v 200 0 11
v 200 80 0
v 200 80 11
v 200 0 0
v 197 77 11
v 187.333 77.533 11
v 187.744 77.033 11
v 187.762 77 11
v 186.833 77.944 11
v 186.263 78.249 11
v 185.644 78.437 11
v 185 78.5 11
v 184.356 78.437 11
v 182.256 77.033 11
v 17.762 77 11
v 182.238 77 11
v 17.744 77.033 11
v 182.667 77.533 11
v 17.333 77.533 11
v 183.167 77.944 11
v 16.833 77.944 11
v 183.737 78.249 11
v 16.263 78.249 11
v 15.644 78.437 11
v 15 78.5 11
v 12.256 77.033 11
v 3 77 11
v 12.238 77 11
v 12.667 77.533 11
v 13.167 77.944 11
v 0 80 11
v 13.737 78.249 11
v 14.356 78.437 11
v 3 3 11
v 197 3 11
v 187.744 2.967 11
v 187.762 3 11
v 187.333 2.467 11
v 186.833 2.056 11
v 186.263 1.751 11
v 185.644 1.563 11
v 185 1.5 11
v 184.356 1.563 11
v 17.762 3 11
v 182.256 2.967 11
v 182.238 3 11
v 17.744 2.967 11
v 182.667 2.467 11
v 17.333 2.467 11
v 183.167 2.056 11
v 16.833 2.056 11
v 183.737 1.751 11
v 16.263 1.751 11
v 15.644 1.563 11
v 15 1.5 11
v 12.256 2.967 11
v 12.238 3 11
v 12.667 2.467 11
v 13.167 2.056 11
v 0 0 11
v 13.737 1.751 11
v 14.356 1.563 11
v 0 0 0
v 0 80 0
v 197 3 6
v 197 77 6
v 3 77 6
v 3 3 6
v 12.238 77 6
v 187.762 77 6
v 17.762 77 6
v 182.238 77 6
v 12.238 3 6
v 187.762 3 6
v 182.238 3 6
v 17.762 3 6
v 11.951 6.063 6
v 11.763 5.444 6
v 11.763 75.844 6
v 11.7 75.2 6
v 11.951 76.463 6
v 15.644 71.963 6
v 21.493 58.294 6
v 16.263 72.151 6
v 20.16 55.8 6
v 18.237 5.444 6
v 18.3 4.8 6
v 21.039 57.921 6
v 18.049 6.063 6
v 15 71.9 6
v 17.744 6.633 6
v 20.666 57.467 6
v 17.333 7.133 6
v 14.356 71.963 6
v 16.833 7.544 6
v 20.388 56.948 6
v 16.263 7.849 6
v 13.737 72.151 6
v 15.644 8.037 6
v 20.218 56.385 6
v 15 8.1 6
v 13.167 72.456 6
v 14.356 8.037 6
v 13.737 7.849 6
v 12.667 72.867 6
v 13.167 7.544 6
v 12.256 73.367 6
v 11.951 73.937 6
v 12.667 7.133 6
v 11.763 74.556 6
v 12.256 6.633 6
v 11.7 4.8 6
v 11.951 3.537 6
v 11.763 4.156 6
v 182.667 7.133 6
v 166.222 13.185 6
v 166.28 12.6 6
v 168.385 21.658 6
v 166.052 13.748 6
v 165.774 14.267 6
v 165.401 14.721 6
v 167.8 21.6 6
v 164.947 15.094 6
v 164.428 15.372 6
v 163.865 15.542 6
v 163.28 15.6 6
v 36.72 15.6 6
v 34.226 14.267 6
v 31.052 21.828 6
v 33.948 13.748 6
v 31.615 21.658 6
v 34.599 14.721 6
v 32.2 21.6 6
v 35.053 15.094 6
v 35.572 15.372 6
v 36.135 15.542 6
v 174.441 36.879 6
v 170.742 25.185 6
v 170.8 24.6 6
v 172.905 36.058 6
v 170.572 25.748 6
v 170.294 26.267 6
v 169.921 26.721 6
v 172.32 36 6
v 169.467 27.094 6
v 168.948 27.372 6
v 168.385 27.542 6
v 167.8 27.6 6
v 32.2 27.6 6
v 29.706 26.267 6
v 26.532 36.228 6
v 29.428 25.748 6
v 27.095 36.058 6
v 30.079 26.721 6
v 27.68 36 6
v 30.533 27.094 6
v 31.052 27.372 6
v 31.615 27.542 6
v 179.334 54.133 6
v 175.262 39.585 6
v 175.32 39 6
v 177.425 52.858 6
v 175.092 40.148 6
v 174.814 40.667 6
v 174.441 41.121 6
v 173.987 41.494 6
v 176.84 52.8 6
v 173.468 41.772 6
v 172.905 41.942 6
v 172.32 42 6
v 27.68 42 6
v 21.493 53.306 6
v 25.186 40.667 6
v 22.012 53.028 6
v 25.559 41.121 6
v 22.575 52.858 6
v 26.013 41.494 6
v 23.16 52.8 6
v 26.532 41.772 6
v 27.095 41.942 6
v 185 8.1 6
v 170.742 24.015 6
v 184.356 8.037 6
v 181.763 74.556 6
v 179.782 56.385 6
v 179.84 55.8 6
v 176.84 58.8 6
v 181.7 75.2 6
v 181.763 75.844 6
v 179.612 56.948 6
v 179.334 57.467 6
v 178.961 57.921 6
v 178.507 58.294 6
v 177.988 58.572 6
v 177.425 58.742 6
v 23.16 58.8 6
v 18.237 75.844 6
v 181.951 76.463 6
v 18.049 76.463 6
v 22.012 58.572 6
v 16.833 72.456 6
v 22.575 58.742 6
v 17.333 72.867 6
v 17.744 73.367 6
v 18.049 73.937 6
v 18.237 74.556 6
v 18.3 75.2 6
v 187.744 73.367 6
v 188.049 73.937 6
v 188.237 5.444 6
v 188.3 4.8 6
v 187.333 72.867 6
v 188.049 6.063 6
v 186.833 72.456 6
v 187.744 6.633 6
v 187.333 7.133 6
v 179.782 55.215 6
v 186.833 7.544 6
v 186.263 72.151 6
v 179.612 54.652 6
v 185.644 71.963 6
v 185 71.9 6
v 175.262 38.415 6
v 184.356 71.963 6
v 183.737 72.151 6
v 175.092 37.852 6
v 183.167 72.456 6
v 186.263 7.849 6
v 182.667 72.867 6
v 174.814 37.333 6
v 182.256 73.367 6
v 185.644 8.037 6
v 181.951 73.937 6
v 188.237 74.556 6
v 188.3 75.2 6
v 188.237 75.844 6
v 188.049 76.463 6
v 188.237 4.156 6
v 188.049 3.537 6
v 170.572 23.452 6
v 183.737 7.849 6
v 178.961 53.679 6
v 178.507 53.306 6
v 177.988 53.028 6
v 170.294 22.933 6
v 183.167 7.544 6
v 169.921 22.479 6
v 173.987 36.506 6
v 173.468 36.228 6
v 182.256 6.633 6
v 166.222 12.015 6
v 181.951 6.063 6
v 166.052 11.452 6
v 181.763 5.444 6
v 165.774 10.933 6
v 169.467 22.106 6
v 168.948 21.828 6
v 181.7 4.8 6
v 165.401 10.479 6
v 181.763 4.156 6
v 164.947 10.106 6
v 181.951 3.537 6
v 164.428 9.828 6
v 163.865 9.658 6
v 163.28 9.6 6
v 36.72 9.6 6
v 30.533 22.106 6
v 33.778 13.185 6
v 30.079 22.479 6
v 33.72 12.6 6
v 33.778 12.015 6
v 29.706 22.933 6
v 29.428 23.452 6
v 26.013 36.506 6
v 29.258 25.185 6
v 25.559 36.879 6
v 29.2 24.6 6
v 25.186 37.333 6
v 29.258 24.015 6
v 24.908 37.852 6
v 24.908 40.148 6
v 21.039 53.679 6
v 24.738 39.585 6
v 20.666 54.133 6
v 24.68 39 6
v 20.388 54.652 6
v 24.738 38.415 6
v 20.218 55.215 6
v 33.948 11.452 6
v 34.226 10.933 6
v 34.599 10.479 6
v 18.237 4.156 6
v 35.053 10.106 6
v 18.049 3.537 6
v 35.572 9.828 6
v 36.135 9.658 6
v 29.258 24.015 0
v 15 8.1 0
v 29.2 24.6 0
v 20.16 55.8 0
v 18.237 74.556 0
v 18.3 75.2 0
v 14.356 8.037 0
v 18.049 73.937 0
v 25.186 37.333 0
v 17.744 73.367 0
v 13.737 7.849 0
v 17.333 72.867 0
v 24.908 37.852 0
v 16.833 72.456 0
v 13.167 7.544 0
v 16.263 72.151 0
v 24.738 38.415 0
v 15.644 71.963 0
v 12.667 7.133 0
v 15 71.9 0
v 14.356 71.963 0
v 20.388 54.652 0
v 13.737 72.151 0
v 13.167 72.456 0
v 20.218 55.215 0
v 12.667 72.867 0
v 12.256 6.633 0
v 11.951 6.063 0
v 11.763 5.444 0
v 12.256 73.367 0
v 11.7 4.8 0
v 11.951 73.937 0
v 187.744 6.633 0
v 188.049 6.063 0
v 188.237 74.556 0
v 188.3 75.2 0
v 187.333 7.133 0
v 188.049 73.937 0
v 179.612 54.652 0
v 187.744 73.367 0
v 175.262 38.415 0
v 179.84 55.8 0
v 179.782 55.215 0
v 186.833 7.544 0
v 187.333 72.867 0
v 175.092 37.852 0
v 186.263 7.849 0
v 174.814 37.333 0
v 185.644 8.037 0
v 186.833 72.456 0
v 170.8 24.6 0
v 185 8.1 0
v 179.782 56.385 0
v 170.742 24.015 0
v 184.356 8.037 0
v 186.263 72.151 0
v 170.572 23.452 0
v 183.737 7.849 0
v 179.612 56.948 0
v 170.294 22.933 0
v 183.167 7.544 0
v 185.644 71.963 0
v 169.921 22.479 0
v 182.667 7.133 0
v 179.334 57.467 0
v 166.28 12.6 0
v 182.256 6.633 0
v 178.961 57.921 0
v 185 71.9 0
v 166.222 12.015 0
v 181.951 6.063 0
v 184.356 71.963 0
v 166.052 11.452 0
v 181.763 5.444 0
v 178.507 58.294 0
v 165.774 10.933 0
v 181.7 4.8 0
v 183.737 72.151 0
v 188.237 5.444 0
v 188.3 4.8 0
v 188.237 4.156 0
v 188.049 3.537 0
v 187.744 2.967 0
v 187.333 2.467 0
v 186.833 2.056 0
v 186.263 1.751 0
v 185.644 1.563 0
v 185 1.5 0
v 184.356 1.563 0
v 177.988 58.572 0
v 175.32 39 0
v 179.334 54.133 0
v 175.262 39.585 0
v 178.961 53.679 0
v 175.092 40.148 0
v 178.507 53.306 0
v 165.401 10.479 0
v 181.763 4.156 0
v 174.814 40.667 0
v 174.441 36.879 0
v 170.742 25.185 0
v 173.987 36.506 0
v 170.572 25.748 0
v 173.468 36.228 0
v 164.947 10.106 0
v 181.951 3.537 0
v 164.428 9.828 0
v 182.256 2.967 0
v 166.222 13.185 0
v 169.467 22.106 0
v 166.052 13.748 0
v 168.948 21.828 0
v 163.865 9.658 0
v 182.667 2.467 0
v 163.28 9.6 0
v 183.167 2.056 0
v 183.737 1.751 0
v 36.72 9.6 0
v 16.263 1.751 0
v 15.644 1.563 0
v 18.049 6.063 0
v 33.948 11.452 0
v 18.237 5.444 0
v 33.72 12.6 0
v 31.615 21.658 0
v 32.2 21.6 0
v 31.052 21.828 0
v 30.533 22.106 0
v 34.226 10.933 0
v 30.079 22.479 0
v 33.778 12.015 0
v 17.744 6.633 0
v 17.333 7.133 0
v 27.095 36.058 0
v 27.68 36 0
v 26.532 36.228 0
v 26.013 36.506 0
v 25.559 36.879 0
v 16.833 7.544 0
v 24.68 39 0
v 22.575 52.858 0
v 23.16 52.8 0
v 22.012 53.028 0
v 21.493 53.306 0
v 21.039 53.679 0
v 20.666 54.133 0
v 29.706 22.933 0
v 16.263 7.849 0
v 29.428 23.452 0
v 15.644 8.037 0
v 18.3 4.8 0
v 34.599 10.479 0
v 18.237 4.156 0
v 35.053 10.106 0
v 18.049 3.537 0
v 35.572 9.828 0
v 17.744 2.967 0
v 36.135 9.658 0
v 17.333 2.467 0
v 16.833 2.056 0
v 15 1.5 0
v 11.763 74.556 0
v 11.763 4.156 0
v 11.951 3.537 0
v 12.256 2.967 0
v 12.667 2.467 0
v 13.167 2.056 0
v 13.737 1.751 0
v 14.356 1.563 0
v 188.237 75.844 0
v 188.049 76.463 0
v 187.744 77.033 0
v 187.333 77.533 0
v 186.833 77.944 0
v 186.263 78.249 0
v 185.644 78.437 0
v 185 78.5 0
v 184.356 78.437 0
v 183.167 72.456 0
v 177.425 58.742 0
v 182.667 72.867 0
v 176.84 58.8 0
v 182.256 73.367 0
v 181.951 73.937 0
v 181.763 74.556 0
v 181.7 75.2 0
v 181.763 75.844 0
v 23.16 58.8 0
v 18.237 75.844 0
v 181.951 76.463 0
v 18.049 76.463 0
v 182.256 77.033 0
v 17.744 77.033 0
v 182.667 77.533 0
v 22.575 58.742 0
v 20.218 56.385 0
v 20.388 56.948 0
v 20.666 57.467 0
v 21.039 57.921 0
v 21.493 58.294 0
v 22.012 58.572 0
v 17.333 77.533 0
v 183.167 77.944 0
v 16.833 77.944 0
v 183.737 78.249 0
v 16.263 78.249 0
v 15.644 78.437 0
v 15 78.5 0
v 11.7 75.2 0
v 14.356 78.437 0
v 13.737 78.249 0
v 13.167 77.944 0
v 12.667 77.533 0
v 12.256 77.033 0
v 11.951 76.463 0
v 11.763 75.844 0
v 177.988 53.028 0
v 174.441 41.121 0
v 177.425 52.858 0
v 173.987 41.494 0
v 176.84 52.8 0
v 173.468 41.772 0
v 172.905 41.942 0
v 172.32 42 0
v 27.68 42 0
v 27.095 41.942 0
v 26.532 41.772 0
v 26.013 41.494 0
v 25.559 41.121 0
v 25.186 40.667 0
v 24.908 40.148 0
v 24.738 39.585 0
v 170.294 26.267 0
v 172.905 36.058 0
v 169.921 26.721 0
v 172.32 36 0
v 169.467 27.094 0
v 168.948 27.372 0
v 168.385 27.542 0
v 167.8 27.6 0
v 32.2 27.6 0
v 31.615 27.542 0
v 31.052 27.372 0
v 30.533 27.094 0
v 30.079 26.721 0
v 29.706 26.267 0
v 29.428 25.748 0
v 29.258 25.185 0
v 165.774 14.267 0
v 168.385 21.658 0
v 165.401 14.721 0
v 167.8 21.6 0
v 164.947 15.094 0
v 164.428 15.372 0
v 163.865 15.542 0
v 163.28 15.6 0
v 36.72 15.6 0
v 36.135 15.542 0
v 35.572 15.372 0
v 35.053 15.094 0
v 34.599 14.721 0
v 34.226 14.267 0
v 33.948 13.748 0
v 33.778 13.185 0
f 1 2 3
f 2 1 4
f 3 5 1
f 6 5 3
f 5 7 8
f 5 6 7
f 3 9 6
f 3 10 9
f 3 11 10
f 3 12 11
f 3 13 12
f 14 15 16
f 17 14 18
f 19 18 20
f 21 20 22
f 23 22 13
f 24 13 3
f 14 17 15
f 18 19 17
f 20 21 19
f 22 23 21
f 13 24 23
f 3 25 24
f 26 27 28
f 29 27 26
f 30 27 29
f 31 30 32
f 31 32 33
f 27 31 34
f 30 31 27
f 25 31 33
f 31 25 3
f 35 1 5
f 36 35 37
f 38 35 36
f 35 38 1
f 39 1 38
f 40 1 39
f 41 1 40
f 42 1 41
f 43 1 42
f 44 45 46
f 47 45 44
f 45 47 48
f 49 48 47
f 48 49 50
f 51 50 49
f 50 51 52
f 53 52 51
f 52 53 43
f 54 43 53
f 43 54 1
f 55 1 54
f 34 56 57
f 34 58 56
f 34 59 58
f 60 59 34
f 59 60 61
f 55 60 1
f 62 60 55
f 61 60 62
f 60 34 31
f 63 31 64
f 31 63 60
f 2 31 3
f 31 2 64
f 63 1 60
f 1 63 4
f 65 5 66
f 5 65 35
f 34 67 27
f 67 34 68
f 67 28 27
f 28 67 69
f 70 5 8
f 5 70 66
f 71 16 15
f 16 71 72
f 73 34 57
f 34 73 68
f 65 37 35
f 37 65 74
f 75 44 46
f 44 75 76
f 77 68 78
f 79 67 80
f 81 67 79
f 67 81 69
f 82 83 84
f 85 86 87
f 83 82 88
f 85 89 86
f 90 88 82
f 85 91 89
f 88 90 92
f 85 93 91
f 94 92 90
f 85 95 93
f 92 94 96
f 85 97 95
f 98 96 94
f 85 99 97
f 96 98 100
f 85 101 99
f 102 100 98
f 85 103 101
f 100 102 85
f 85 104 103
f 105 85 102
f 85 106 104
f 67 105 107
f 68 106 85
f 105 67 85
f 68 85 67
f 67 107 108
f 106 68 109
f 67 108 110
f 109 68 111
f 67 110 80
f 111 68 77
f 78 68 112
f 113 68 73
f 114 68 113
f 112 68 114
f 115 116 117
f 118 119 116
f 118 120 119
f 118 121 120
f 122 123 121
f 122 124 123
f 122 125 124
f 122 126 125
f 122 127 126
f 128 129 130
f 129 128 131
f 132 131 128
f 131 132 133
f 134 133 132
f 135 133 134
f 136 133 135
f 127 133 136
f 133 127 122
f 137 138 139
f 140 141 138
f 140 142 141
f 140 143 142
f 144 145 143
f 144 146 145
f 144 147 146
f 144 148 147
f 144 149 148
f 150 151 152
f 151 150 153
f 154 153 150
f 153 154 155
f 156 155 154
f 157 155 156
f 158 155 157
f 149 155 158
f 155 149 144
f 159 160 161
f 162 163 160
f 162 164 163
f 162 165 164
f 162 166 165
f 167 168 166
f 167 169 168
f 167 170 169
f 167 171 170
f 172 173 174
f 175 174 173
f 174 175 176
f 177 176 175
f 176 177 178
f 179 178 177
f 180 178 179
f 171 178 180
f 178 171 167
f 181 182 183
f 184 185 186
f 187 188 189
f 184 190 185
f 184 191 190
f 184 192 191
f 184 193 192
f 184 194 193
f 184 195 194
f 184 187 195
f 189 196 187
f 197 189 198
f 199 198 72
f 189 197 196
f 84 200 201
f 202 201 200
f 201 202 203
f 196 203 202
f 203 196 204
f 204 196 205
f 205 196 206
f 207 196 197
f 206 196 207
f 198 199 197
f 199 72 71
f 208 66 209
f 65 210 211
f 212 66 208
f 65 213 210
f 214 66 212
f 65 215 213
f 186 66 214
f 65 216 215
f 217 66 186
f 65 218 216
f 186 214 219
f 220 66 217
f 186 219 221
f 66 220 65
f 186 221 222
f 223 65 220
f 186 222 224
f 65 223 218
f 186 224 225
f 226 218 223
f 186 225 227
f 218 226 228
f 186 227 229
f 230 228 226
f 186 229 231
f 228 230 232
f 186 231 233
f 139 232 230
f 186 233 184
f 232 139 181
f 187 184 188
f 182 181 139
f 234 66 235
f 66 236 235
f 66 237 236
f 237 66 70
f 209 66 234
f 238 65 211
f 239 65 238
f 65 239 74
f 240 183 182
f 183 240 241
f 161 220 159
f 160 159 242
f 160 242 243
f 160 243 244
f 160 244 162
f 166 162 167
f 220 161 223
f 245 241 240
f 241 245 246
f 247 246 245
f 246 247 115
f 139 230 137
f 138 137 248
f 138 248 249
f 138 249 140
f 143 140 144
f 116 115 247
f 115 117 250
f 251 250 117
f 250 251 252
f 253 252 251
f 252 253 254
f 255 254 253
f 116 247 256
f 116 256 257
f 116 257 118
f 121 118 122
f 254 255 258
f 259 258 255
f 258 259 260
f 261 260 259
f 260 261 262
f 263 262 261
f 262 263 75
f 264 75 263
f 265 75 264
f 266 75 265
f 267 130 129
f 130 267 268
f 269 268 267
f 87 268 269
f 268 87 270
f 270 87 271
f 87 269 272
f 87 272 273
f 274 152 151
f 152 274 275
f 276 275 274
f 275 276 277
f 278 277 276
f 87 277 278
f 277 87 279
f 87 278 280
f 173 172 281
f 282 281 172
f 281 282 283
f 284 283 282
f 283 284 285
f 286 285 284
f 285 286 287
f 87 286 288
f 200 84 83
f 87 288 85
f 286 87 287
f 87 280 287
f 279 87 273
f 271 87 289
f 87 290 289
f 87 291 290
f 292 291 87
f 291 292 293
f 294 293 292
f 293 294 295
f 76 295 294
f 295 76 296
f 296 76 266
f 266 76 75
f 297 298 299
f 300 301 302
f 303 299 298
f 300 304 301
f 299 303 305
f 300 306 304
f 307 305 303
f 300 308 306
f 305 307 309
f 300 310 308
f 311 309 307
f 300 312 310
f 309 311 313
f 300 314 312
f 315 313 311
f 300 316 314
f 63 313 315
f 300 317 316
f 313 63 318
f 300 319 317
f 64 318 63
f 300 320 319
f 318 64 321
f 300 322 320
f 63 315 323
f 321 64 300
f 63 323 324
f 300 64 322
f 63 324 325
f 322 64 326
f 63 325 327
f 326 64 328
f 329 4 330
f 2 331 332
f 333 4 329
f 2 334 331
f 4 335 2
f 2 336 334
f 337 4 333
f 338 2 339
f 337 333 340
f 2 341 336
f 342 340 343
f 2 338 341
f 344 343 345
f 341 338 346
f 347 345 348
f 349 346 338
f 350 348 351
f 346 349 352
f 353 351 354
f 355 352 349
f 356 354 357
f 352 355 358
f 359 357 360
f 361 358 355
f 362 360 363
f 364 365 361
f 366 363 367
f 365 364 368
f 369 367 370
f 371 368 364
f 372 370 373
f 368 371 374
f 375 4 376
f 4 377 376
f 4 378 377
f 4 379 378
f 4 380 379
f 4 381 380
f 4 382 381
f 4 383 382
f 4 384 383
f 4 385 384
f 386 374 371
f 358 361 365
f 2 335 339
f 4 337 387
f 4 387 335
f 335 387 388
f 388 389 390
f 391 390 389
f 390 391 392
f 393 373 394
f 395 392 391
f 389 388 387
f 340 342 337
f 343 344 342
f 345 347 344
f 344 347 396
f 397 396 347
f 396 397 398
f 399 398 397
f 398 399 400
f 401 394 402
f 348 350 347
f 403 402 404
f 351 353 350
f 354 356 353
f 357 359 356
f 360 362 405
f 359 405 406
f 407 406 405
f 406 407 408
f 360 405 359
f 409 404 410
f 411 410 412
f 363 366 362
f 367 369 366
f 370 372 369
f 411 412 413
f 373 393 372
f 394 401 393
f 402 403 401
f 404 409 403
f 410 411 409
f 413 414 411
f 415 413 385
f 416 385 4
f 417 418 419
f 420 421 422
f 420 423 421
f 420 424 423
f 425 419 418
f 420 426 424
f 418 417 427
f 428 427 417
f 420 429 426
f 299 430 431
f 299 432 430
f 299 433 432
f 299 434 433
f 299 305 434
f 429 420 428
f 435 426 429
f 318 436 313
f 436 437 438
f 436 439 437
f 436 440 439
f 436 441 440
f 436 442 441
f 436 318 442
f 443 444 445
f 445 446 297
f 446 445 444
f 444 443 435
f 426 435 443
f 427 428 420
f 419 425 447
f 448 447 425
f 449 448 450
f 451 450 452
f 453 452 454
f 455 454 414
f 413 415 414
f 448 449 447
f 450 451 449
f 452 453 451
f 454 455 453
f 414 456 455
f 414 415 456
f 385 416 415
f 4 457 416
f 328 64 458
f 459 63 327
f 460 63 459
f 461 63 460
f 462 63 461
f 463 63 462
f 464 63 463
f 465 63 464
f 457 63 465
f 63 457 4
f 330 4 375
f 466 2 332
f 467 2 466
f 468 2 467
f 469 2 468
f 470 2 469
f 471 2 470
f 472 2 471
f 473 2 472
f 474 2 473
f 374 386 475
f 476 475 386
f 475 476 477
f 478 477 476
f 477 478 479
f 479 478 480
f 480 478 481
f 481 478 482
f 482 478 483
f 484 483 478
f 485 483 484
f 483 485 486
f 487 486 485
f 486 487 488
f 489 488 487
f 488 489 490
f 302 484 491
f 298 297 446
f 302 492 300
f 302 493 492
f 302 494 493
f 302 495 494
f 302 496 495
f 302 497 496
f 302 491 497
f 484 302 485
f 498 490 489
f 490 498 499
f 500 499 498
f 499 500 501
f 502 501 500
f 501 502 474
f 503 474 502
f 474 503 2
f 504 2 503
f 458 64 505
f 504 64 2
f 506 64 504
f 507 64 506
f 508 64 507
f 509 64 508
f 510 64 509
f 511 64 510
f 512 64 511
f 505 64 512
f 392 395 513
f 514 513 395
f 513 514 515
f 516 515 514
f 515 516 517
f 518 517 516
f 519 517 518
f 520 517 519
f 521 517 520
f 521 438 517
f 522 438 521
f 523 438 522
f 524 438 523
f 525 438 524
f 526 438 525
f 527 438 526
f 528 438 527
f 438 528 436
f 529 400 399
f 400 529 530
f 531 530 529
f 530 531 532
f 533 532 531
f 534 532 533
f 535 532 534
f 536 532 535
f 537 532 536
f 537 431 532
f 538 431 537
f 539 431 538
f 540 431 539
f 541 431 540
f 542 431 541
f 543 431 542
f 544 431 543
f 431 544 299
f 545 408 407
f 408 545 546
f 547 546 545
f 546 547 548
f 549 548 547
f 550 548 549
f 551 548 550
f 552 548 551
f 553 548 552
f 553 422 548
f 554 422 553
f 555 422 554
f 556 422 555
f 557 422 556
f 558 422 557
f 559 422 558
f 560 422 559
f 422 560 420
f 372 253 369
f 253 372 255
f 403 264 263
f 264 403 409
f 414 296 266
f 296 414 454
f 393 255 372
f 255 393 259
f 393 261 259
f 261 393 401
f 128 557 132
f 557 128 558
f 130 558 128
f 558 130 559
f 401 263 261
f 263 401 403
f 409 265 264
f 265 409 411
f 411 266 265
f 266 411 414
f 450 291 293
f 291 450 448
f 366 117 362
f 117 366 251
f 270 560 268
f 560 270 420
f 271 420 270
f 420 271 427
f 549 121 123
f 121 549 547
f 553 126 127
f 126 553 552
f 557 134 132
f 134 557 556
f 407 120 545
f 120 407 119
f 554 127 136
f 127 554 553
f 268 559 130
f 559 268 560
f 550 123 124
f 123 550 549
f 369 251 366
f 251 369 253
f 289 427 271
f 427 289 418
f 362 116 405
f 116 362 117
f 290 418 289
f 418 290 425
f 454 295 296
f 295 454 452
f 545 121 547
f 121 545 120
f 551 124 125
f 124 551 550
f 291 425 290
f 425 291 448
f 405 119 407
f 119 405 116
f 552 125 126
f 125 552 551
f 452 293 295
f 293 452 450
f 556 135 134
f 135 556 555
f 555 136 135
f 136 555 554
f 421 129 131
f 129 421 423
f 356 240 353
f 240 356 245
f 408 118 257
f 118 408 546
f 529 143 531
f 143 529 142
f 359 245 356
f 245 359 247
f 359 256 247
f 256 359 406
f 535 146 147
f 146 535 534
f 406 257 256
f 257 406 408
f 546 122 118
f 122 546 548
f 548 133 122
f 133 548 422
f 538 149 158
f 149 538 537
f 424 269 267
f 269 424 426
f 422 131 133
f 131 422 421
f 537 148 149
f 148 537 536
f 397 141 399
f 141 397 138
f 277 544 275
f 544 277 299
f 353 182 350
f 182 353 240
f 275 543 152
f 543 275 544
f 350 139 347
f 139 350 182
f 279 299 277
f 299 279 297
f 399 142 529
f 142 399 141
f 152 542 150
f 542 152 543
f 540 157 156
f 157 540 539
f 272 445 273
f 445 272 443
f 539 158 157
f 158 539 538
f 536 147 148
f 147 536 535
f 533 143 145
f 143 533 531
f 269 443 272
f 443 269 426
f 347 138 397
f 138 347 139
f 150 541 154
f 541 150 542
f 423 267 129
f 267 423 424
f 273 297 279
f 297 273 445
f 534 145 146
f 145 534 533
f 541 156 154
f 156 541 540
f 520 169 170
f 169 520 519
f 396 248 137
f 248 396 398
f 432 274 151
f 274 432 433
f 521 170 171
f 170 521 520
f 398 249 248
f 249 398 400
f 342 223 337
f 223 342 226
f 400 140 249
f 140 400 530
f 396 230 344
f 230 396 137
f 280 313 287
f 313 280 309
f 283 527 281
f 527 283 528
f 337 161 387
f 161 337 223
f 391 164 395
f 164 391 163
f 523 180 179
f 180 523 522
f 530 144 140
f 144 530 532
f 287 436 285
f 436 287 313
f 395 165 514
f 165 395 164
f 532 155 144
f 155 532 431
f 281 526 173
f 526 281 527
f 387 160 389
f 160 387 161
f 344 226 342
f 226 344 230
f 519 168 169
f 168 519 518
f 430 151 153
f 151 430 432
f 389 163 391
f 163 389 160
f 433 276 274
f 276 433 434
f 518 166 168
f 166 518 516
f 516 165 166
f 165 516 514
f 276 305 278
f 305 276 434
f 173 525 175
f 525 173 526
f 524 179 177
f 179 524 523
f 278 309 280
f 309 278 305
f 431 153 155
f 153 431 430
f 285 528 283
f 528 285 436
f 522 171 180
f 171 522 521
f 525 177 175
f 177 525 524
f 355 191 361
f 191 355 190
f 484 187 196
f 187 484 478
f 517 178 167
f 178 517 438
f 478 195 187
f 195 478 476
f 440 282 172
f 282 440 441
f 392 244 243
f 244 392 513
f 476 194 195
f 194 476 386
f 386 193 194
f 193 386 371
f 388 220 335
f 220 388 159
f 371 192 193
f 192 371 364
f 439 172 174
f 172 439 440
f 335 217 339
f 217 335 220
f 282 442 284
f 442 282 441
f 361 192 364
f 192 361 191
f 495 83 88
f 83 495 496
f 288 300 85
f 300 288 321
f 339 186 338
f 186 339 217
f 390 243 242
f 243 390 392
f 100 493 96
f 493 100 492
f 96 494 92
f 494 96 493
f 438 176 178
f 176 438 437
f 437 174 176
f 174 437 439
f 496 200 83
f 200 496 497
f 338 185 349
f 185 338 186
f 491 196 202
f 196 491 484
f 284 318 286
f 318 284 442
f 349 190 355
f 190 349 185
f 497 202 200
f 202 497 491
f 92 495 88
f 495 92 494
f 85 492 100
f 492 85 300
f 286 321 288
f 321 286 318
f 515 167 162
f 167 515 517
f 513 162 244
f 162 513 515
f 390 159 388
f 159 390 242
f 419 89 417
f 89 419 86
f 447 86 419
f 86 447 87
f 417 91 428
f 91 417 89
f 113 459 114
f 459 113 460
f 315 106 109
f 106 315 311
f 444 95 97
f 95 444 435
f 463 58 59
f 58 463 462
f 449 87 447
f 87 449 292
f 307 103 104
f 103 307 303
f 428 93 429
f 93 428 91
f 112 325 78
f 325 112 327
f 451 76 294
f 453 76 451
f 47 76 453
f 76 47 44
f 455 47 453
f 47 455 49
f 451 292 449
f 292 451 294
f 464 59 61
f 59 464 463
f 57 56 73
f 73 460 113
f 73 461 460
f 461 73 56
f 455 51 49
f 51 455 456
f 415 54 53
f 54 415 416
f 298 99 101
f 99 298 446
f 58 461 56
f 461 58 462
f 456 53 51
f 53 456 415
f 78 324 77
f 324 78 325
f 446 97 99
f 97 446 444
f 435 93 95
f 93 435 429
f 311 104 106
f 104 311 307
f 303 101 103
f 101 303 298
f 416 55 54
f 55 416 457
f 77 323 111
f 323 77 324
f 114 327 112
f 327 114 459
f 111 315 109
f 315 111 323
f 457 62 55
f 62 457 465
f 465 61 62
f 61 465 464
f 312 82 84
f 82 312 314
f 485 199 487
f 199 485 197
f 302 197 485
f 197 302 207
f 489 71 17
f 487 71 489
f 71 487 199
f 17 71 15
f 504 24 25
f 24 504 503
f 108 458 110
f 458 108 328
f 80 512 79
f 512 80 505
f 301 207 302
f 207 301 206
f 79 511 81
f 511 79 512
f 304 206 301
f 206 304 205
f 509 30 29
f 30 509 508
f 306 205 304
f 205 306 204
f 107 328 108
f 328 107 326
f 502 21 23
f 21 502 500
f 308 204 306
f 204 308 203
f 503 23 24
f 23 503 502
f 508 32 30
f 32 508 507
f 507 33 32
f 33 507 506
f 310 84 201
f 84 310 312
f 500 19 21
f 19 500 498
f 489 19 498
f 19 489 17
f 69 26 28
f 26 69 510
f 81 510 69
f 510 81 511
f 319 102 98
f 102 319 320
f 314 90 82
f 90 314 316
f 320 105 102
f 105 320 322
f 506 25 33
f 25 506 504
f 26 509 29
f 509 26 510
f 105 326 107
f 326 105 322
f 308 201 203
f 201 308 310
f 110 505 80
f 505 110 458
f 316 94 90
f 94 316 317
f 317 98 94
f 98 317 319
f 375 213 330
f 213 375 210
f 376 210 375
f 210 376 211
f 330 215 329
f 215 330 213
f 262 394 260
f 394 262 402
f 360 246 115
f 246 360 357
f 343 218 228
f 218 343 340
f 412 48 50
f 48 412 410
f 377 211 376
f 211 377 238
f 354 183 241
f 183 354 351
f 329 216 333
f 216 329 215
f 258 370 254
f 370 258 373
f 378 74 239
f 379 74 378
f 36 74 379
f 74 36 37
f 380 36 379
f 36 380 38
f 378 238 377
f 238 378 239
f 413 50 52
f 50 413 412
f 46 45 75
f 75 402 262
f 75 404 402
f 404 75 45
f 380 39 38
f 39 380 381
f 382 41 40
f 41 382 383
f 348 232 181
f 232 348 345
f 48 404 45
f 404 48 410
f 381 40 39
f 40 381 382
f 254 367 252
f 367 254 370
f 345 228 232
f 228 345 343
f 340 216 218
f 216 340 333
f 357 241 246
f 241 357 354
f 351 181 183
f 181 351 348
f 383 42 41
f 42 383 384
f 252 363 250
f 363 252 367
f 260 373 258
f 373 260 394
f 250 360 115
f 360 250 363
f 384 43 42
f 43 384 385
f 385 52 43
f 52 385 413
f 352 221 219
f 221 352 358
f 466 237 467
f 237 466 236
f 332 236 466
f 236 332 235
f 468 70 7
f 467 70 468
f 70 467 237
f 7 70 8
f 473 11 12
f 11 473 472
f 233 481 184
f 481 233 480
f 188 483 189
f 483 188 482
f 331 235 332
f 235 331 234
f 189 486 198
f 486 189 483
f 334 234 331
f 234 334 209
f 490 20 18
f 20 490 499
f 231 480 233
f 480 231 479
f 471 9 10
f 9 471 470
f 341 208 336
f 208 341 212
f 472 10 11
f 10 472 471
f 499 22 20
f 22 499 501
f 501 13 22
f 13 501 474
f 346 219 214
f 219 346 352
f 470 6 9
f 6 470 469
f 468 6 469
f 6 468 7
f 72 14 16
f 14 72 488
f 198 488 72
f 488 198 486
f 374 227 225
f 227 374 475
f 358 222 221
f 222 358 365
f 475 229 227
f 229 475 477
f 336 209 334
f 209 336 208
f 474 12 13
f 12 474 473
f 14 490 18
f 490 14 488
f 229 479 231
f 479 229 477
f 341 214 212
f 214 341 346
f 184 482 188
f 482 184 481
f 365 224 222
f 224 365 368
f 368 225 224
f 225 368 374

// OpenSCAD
$fn = 32;

// ----------------------------------------------------------------------
// Slotted panel: 200 x 80 mm, 4 ряда of slots
// ----------------------------------------------------------------------

// --- parameters (mm) ---
panel_w = 200;            // panel width
panel_d = 80;             // panel depth
thick = 6;                // panel thickness
slot_w = 6;               // slot width
pitch0 = 12;              // first row pitch
pitch_step = 2.4;         // pitch increase per row
margin = 9.6;             // margin around the slot field
rows = 4;                 // number of slot rows
mount_d = 6.6;            // mounting holes
mount_x = 85;             // mounting hole offset
rim_h = 11;               // rim height
rim_t = 3;                // rim wall thickness

difference() {
  union() {
    cube([panel_w, panel_d, thick]);
    translate([0, 0, thick - 1]) difference() {
      cube([panel_w, panel_d, rim_h - thick + 1]);
      translate([rim_t, rim_t, -2.5]) cube([panel_w - 2 * rim_t, panel_d - 2 * rim_t, rim_h - thick + 6]);
    }
  }
  /* slot rows: stadium shaped cutters, 2.5 mm clear of both faces */
  /* row 0: pitch 12, length 126.56 */
  hull() {
    translate([36.72, 12.6, -2.5]) cylinder(h = thick + 5, d = slot_w);
    translate([163.28, 12.6, -2.5]) cylinder(h = thick + 5, d = slot_w);
  }
  /* row 1: pitch 14.4, length 135.6 */
  hull() {
    translate([32.2, 24.6, -2.5]) cylinder(h = thick + 5, d = slot_w);
    translate([167.8, 24.6, -2.5]) cylinder(h = thick + 5, d = slot_w);
  }
  /* row 2: pitch 16.8, length 144.64 */
  hull() {
    translate([27.68, 39, -2.5]) cylinder(h = thick + 5, d = slot_w);
    translate([172.32, 39, -2.5]) cylinder(h = thick + 5, d = slot_w);
  }
  /* row 3: pitch 19.2, length 153.68 */
  hull() {
    translate([23.16, 55.8, -2.5]) cylinder(h = thick + 5, d = slot_w);
    translate([176.84, 55.8, -2.5]) cylinder(h = thick + 5, d = slot_w);
  }
  translate([15, 4.8, -2.5]) cylinder(h = 16, d = mount_d);
  translate([15, 75.2, -2.5]) cylinder(h = 16, d = mount_d);
  translate([185, 4.8, -2.5]) cylinder(h = 16, d = mount_d);
  translate([185, 75.2, -2.5]) cylinder(h = 16, d = mount_d);
}
